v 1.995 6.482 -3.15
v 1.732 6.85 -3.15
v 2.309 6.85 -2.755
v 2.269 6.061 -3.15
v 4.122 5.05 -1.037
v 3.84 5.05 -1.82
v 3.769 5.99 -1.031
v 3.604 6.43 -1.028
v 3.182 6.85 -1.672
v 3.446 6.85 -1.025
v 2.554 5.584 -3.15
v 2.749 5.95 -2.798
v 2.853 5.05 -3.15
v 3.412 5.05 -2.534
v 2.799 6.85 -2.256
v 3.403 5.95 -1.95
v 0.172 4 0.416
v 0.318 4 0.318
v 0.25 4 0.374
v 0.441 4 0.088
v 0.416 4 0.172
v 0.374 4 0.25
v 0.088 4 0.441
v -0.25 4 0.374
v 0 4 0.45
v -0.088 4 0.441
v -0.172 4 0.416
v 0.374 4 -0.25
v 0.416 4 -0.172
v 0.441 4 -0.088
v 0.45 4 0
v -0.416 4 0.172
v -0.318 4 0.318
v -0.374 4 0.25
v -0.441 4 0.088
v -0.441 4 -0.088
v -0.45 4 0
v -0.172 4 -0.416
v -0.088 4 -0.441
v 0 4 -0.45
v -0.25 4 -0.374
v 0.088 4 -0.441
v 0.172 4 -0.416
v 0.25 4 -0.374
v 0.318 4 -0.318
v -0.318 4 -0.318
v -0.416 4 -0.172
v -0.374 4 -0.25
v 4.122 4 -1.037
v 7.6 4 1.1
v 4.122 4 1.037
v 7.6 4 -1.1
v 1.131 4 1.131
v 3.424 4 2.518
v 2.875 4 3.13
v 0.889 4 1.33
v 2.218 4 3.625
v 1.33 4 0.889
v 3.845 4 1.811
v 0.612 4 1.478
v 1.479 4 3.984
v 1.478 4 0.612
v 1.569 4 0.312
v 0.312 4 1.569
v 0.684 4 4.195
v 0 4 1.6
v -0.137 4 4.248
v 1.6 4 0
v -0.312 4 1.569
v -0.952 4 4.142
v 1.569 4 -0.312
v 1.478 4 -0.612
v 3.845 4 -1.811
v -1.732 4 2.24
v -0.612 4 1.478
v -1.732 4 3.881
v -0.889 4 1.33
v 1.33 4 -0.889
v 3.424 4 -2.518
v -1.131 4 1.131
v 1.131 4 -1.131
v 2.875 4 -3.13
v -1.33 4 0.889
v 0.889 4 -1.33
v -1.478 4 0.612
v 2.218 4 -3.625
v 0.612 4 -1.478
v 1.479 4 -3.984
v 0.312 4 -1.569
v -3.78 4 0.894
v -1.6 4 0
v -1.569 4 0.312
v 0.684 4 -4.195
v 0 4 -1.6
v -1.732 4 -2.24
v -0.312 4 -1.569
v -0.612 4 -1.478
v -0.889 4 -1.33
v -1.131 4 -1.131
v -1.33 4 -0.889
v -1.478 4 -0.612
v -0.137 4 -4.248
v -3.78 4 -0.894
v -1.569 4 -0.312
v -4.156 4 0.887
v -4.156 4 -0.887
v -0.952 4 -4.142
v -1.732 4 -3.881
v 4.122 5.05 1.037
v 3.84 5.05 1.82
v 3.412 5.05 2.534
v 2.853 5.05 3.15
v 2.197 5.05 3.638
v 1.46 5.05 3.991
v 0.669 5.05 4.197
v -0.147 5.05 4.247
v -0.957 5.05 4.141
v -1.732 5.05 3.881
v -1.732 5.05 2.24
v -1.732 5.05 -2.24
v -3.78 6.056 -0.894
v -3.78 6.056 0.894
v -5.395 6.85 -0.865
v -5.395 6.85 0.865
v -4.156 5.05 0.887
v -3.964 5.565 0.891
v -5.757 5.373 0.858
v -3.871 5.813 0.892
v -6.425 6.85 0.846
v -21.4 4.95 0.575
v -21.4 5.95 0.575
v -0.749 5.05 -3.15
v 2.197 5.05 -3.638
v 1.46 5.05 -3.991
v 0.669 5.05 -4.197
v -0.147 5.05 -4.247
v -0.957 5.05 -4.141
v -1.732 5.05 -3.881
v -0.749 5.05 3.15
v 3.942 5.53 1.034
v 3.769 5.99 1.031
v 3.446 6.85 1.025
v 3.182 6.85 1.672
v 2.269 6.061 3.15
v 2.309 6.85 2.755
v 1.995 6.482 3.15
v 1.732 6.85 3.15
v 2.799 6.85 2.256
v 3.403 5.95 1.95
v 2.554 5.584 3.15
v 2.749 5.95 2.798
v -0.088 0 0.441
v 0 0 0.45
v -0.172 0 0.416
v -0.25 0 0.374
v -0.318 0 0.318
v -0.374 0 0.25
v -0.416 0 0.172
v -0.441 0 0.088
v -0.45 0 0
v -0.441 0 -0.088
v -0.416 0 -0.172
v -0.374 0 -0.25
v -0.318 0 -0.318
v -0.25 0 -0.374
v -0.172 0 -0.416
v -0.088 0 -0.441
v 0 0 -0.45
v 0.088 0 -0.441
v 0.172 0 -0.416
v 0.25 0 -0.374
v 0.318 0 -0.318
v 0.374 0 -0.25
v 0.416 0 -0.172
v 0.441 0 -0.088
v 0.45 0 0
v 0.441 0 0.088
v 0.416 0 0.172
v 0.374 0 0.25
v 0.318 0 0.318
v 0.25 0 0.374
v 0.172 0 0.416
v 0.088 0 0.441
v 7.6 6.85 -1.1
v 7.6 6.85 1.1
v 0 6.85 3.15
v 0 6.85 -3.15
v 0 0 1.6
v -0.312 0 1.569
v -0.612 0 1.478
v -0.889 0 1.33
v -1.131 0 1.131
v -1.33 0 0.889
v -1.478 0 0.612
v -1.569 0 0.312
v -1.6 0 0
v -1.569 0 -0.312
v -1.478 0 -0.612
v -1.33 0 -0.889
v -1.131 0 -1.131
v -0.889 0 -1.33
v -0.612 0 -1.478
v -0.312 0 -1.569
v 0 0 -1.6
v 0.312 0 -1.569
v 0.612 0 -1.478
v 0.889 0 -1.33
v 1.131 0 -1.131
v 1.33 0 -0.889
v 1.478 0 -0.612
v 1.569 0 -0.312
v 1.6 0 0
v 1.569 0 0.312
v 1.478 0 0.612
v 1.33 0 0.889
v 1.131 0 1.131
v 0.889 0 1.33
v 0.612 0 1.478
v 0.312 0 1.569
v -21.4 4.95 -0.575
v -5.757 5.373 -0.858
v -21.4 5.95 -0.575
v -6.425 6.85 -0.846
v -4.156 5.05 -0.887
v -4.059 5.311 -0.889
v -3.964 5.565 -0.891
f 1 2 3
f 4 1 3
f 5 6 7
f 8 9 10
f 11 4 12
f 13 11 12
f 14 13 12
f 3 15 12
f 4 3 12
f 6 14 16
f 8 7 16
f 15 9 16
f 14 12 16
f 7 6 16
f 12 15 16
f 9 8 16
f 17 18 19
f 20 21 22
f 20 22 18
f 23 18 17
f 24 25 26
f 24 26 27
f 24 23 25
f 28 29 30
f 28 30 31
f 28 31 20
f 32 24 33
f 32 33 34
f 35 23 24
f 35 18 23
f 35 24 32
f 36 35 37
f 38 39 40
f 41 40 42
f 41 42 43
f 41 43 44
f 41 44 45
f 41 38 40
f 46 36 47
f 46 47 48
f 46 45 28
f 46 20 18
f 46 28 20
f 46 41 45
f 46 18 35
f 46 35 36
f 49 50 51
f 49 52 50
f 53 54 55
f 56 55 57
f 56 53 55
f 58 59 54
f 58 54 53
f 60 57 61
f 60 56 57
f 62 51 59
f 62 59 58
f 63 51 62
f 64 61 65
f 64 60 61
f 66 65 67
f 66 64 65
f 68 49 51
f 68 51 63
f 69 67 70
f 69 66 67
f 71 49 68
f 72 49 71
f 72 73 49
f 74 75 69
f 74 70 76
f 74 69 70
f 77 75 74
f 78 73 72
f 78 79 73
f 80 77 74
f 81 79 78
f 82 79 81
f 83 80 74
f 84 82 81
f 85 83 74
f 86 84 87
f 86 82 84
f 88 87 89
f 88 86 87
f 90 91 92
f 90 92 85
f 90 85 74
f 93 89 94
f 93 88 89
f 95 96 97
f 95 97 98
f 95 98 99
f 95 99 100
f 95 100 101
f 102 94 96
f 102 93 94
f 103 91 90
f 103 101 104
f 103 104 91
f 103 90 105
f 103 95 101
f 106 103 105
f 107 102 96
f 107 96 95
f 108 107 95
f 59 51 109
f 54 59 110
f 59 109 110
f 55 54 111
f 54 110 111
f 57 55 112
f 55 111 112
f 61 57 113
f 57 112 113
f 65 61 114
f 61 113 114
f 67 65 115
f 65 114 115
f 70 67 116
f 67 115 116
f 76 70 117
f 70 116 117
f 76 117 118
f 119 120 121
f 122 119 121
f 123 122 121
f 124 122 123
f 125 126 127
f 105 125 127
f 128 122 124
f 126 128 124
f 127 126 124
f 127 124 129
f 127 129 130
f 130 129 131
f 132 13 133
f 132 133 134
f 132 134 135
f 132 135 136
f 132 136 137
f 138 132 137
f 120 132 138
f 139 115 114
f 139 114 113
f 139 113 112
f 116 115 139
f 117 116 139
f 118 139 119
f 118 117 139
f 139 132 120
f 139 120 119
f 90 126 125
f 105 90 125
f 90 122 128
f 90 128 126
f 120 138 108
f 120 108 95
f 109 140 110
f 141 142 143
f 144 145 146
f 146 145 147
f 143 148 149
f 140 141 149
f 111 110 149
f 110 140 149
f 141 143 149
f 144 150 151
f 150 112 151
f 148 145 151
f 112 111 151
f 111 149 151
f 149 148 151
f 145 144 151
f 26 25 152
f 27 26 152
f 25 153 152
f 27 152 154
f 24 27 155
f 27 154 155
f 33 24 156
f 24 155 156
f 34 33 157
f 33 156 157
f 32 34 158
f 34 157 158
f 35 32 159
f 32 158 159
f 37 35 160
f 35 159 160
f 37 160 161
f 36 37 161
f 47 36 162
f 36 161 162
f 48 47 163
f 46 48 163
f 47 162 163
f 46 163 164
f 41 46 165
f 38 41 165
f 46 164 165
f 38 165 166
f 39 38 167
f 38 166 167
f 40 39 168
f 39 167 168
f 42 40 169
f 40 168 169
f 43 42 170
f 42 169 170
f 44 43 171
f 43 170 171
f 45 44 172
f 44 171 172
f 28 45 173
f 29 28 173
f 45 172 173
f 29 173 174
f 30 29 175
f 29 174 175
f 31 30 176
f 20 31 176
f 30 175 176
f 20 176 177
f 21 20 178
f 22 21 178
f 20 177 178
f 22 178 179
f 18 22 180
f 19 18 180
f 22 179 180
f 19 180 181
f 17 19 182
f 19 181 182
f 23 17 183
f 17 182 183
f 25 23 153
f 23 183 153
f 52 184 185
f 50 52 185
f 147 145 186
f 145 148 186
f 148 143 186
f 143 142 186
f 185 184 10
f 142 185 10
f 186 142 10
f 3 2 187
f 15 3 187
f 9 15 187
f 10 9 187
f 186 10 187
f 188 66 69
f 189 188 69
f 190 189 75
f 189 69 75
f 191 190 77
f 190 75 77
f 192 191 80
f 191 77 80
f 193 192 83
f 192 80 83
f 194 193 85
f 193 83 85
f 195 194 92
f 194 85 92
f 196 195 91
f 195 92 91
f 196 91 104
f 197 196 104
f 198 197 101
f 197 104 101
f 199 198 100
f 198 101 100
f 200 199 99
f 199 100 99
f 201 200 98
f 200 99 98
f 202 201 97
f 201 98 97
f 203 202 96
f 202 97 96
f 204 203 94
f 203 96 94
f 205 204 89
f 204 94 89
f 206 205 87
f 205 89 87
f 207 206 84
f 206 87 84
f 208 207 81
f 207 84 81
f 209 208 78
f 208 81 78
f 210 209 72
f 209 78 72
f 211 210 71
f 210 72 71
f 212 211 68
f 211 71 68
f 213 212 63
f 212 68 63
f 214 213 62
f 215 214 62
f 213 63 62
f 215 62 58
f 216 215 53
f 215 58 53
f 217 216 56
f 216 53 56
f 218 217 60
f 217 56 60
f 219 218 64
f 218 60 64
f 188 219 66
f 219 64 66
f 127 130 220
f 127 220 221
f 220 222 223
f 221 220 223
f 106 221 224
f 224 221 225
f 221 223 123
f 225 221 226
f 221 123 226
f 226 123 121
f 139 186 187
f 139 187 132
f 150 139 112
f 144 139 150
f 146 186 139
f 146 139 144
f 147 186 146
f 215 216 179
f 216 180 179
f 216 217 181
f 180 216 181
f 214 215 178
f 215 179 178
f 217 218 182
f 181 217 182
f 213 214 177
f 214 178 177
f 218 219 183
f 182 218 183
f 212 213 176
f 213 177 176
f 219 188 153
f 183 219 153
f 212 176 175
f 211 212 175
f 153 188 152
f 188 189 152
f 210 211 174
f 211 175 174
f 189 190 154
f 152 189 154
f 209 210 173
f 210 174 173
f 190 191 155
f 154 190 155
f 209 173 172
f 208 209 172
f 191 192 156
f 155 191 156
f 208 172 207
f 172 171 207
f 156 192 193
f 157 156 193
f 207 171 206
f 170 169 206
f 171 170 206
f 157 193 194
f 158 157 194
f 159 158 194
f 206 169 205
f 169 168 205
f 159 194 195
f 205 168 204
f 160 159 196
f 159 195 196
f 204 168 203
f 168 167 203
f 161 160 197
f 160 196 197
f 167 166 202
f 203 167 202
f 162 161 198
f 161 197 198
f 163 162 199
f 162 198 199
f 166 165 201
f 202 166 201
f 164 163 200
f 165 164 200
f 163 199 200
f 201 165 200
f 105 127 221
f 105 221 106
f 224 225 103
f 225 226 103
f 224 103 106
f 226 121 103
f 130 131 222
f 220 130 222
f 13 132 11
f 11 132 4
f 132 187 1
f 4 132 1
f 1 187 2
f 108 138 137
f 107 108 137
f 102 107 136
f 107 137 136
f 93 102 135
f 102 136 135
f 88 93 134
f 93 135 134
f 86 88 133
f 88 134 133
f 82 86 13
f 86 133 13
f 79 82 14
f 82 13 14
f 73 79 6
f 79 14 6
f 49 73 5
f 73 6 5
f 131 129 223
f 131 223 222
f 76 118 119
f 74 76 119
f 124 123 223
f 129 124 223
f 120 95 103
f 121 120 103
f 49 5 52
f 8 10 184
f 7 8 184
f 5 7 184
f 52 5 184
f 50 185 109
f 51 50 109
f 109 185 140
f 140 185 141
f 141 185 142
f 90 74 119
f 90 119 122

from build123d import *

# Parameters (mm, degrees)
EXTRUDE_1_DEPTH          = 2.85
SKETCH_3_OUTSIDE_W       = 37.198
SKETCH_3_OUTSIDE_H       = 16.698
SKETCH_3_OUTSIDE_W_2     = 45.46824203
SKETCH_3_OUTSIDE_H_2     = 6.3
CUT_EXTRUDE_1_DEPTH      = 1.8
CUT_EXTRUDE_2_DEPTH      = 8.4
CUT_EXTRUDE_4_DEPTH      = 2.8
CUT_EXTRUDE_4_DEPTH_BACK = 6.05


with BuildPart() as part:
    # Эскиз1 → Повернуть1 (revolve)
    with BuildSketch(Plane(origin=(0, 0, 0), x_dir=(0, 0, -1), z_dir=(1, 0, 0))):
        Polygon((-0.45, 0), (-1.6, 0), (-1.6, 4), (-4.25, 4), (-4.25, 5.05), (-3.594853578, 6.85), (0, 6.85), (0, 5), (-0.45, 5), align=None)
    revolve(axis=Axis((0, 0, 0), (0, -1, 0)))

    # Эскиз2 → Бобышка-Вытянуть1 (add)
    with BuildSketch(Plane(origin=(0, 6.85, 0), x_dir=(1, 0, 0), z_dir=(0, 1, 0))):
        Polygon((-21.4, -0.575), (-21.4, 0.575), (7.6, 1.1), (7.6, -1.1), align=None)
    extrude(amount=-EXTRUDE_1_DEPTH)

    # Эскиз3 outside → Вырез-Вытянуть1 (cut)
    with BuildSketch(Plane(origin=(0, 6.85, 0), x_dir=(1, 0, 0), z_dir=(0, 1, 0))):
        with Locations((-6.9, 0)):
            Rectangle(SKETCH_3_OUTSIDE_W, SKETCH_3_OUTSIDE_H)
        Rectangle(SKETCH_3_OUTSIDE_W_2, SKETCH_3_OUTSIDE_H_2, mode=Mode.SUBTRACT)
    extrude(amount=-CUT_EXTRUDE_1_DEPTH, mode=Mode.SUBTRACT)

    # Эскиз4 → Вырез-Вытянуть2 (cut, through all)
    with BuildSketch(Plane.XY.offset(3.15)):
        Polygon((0, 6.85), (-0.749299763, 5.05), (-1.732187129, 5.05), (-5.395285576, 6.85), align=None)
        Polygon((-6.4250568, 6.85), (-21.4, 5.95), (-21.4, 6.85), align=None)
        Polygon((-21.4, 4.95), (-5.756816797, 5.373014976), (-4.15637233, 4), (-21.4, 4), align=None)
    extrude(amount=-CUT_EXTRUDE_2_DEPTH, mode=Mode.SUBTRACT)

    # Эскиз5 → Вырез-Вытянуть4 (cut, two sides)
    with BuildSketch(Plane(origin=(0, 5.05, 0), x_dir=(1, 0, 0), z_dir=(0, 1, 0))) as cut_extrude_4_sk:
        Polygon((-1.732187129, 4.790977117), (-1.732187129, 2.23974472), (-3.779539394, 0.893991097), (-5.395285576, 0.86474052), (-3.779539394, 4.790977117), align=None)
        Polygon((-5.395285576, -0.86474052), (-3.779539394, -4.790977117), (-1.732187129, -4.790977117), (-1.732187129, -2.23974472), (-3.779539394, -0.893991097), align=None)
    extrude(amount=CUT_EXTRUDE_4_DEPTH, mode=Mode.SUBTRACT)
    extrude(cut_extrude_4_sk.sketch, amount=-CUT_EXTRUDE_4_DEPTH_BACK, mode=Mode.SUBTRACT)


solid = part.part
